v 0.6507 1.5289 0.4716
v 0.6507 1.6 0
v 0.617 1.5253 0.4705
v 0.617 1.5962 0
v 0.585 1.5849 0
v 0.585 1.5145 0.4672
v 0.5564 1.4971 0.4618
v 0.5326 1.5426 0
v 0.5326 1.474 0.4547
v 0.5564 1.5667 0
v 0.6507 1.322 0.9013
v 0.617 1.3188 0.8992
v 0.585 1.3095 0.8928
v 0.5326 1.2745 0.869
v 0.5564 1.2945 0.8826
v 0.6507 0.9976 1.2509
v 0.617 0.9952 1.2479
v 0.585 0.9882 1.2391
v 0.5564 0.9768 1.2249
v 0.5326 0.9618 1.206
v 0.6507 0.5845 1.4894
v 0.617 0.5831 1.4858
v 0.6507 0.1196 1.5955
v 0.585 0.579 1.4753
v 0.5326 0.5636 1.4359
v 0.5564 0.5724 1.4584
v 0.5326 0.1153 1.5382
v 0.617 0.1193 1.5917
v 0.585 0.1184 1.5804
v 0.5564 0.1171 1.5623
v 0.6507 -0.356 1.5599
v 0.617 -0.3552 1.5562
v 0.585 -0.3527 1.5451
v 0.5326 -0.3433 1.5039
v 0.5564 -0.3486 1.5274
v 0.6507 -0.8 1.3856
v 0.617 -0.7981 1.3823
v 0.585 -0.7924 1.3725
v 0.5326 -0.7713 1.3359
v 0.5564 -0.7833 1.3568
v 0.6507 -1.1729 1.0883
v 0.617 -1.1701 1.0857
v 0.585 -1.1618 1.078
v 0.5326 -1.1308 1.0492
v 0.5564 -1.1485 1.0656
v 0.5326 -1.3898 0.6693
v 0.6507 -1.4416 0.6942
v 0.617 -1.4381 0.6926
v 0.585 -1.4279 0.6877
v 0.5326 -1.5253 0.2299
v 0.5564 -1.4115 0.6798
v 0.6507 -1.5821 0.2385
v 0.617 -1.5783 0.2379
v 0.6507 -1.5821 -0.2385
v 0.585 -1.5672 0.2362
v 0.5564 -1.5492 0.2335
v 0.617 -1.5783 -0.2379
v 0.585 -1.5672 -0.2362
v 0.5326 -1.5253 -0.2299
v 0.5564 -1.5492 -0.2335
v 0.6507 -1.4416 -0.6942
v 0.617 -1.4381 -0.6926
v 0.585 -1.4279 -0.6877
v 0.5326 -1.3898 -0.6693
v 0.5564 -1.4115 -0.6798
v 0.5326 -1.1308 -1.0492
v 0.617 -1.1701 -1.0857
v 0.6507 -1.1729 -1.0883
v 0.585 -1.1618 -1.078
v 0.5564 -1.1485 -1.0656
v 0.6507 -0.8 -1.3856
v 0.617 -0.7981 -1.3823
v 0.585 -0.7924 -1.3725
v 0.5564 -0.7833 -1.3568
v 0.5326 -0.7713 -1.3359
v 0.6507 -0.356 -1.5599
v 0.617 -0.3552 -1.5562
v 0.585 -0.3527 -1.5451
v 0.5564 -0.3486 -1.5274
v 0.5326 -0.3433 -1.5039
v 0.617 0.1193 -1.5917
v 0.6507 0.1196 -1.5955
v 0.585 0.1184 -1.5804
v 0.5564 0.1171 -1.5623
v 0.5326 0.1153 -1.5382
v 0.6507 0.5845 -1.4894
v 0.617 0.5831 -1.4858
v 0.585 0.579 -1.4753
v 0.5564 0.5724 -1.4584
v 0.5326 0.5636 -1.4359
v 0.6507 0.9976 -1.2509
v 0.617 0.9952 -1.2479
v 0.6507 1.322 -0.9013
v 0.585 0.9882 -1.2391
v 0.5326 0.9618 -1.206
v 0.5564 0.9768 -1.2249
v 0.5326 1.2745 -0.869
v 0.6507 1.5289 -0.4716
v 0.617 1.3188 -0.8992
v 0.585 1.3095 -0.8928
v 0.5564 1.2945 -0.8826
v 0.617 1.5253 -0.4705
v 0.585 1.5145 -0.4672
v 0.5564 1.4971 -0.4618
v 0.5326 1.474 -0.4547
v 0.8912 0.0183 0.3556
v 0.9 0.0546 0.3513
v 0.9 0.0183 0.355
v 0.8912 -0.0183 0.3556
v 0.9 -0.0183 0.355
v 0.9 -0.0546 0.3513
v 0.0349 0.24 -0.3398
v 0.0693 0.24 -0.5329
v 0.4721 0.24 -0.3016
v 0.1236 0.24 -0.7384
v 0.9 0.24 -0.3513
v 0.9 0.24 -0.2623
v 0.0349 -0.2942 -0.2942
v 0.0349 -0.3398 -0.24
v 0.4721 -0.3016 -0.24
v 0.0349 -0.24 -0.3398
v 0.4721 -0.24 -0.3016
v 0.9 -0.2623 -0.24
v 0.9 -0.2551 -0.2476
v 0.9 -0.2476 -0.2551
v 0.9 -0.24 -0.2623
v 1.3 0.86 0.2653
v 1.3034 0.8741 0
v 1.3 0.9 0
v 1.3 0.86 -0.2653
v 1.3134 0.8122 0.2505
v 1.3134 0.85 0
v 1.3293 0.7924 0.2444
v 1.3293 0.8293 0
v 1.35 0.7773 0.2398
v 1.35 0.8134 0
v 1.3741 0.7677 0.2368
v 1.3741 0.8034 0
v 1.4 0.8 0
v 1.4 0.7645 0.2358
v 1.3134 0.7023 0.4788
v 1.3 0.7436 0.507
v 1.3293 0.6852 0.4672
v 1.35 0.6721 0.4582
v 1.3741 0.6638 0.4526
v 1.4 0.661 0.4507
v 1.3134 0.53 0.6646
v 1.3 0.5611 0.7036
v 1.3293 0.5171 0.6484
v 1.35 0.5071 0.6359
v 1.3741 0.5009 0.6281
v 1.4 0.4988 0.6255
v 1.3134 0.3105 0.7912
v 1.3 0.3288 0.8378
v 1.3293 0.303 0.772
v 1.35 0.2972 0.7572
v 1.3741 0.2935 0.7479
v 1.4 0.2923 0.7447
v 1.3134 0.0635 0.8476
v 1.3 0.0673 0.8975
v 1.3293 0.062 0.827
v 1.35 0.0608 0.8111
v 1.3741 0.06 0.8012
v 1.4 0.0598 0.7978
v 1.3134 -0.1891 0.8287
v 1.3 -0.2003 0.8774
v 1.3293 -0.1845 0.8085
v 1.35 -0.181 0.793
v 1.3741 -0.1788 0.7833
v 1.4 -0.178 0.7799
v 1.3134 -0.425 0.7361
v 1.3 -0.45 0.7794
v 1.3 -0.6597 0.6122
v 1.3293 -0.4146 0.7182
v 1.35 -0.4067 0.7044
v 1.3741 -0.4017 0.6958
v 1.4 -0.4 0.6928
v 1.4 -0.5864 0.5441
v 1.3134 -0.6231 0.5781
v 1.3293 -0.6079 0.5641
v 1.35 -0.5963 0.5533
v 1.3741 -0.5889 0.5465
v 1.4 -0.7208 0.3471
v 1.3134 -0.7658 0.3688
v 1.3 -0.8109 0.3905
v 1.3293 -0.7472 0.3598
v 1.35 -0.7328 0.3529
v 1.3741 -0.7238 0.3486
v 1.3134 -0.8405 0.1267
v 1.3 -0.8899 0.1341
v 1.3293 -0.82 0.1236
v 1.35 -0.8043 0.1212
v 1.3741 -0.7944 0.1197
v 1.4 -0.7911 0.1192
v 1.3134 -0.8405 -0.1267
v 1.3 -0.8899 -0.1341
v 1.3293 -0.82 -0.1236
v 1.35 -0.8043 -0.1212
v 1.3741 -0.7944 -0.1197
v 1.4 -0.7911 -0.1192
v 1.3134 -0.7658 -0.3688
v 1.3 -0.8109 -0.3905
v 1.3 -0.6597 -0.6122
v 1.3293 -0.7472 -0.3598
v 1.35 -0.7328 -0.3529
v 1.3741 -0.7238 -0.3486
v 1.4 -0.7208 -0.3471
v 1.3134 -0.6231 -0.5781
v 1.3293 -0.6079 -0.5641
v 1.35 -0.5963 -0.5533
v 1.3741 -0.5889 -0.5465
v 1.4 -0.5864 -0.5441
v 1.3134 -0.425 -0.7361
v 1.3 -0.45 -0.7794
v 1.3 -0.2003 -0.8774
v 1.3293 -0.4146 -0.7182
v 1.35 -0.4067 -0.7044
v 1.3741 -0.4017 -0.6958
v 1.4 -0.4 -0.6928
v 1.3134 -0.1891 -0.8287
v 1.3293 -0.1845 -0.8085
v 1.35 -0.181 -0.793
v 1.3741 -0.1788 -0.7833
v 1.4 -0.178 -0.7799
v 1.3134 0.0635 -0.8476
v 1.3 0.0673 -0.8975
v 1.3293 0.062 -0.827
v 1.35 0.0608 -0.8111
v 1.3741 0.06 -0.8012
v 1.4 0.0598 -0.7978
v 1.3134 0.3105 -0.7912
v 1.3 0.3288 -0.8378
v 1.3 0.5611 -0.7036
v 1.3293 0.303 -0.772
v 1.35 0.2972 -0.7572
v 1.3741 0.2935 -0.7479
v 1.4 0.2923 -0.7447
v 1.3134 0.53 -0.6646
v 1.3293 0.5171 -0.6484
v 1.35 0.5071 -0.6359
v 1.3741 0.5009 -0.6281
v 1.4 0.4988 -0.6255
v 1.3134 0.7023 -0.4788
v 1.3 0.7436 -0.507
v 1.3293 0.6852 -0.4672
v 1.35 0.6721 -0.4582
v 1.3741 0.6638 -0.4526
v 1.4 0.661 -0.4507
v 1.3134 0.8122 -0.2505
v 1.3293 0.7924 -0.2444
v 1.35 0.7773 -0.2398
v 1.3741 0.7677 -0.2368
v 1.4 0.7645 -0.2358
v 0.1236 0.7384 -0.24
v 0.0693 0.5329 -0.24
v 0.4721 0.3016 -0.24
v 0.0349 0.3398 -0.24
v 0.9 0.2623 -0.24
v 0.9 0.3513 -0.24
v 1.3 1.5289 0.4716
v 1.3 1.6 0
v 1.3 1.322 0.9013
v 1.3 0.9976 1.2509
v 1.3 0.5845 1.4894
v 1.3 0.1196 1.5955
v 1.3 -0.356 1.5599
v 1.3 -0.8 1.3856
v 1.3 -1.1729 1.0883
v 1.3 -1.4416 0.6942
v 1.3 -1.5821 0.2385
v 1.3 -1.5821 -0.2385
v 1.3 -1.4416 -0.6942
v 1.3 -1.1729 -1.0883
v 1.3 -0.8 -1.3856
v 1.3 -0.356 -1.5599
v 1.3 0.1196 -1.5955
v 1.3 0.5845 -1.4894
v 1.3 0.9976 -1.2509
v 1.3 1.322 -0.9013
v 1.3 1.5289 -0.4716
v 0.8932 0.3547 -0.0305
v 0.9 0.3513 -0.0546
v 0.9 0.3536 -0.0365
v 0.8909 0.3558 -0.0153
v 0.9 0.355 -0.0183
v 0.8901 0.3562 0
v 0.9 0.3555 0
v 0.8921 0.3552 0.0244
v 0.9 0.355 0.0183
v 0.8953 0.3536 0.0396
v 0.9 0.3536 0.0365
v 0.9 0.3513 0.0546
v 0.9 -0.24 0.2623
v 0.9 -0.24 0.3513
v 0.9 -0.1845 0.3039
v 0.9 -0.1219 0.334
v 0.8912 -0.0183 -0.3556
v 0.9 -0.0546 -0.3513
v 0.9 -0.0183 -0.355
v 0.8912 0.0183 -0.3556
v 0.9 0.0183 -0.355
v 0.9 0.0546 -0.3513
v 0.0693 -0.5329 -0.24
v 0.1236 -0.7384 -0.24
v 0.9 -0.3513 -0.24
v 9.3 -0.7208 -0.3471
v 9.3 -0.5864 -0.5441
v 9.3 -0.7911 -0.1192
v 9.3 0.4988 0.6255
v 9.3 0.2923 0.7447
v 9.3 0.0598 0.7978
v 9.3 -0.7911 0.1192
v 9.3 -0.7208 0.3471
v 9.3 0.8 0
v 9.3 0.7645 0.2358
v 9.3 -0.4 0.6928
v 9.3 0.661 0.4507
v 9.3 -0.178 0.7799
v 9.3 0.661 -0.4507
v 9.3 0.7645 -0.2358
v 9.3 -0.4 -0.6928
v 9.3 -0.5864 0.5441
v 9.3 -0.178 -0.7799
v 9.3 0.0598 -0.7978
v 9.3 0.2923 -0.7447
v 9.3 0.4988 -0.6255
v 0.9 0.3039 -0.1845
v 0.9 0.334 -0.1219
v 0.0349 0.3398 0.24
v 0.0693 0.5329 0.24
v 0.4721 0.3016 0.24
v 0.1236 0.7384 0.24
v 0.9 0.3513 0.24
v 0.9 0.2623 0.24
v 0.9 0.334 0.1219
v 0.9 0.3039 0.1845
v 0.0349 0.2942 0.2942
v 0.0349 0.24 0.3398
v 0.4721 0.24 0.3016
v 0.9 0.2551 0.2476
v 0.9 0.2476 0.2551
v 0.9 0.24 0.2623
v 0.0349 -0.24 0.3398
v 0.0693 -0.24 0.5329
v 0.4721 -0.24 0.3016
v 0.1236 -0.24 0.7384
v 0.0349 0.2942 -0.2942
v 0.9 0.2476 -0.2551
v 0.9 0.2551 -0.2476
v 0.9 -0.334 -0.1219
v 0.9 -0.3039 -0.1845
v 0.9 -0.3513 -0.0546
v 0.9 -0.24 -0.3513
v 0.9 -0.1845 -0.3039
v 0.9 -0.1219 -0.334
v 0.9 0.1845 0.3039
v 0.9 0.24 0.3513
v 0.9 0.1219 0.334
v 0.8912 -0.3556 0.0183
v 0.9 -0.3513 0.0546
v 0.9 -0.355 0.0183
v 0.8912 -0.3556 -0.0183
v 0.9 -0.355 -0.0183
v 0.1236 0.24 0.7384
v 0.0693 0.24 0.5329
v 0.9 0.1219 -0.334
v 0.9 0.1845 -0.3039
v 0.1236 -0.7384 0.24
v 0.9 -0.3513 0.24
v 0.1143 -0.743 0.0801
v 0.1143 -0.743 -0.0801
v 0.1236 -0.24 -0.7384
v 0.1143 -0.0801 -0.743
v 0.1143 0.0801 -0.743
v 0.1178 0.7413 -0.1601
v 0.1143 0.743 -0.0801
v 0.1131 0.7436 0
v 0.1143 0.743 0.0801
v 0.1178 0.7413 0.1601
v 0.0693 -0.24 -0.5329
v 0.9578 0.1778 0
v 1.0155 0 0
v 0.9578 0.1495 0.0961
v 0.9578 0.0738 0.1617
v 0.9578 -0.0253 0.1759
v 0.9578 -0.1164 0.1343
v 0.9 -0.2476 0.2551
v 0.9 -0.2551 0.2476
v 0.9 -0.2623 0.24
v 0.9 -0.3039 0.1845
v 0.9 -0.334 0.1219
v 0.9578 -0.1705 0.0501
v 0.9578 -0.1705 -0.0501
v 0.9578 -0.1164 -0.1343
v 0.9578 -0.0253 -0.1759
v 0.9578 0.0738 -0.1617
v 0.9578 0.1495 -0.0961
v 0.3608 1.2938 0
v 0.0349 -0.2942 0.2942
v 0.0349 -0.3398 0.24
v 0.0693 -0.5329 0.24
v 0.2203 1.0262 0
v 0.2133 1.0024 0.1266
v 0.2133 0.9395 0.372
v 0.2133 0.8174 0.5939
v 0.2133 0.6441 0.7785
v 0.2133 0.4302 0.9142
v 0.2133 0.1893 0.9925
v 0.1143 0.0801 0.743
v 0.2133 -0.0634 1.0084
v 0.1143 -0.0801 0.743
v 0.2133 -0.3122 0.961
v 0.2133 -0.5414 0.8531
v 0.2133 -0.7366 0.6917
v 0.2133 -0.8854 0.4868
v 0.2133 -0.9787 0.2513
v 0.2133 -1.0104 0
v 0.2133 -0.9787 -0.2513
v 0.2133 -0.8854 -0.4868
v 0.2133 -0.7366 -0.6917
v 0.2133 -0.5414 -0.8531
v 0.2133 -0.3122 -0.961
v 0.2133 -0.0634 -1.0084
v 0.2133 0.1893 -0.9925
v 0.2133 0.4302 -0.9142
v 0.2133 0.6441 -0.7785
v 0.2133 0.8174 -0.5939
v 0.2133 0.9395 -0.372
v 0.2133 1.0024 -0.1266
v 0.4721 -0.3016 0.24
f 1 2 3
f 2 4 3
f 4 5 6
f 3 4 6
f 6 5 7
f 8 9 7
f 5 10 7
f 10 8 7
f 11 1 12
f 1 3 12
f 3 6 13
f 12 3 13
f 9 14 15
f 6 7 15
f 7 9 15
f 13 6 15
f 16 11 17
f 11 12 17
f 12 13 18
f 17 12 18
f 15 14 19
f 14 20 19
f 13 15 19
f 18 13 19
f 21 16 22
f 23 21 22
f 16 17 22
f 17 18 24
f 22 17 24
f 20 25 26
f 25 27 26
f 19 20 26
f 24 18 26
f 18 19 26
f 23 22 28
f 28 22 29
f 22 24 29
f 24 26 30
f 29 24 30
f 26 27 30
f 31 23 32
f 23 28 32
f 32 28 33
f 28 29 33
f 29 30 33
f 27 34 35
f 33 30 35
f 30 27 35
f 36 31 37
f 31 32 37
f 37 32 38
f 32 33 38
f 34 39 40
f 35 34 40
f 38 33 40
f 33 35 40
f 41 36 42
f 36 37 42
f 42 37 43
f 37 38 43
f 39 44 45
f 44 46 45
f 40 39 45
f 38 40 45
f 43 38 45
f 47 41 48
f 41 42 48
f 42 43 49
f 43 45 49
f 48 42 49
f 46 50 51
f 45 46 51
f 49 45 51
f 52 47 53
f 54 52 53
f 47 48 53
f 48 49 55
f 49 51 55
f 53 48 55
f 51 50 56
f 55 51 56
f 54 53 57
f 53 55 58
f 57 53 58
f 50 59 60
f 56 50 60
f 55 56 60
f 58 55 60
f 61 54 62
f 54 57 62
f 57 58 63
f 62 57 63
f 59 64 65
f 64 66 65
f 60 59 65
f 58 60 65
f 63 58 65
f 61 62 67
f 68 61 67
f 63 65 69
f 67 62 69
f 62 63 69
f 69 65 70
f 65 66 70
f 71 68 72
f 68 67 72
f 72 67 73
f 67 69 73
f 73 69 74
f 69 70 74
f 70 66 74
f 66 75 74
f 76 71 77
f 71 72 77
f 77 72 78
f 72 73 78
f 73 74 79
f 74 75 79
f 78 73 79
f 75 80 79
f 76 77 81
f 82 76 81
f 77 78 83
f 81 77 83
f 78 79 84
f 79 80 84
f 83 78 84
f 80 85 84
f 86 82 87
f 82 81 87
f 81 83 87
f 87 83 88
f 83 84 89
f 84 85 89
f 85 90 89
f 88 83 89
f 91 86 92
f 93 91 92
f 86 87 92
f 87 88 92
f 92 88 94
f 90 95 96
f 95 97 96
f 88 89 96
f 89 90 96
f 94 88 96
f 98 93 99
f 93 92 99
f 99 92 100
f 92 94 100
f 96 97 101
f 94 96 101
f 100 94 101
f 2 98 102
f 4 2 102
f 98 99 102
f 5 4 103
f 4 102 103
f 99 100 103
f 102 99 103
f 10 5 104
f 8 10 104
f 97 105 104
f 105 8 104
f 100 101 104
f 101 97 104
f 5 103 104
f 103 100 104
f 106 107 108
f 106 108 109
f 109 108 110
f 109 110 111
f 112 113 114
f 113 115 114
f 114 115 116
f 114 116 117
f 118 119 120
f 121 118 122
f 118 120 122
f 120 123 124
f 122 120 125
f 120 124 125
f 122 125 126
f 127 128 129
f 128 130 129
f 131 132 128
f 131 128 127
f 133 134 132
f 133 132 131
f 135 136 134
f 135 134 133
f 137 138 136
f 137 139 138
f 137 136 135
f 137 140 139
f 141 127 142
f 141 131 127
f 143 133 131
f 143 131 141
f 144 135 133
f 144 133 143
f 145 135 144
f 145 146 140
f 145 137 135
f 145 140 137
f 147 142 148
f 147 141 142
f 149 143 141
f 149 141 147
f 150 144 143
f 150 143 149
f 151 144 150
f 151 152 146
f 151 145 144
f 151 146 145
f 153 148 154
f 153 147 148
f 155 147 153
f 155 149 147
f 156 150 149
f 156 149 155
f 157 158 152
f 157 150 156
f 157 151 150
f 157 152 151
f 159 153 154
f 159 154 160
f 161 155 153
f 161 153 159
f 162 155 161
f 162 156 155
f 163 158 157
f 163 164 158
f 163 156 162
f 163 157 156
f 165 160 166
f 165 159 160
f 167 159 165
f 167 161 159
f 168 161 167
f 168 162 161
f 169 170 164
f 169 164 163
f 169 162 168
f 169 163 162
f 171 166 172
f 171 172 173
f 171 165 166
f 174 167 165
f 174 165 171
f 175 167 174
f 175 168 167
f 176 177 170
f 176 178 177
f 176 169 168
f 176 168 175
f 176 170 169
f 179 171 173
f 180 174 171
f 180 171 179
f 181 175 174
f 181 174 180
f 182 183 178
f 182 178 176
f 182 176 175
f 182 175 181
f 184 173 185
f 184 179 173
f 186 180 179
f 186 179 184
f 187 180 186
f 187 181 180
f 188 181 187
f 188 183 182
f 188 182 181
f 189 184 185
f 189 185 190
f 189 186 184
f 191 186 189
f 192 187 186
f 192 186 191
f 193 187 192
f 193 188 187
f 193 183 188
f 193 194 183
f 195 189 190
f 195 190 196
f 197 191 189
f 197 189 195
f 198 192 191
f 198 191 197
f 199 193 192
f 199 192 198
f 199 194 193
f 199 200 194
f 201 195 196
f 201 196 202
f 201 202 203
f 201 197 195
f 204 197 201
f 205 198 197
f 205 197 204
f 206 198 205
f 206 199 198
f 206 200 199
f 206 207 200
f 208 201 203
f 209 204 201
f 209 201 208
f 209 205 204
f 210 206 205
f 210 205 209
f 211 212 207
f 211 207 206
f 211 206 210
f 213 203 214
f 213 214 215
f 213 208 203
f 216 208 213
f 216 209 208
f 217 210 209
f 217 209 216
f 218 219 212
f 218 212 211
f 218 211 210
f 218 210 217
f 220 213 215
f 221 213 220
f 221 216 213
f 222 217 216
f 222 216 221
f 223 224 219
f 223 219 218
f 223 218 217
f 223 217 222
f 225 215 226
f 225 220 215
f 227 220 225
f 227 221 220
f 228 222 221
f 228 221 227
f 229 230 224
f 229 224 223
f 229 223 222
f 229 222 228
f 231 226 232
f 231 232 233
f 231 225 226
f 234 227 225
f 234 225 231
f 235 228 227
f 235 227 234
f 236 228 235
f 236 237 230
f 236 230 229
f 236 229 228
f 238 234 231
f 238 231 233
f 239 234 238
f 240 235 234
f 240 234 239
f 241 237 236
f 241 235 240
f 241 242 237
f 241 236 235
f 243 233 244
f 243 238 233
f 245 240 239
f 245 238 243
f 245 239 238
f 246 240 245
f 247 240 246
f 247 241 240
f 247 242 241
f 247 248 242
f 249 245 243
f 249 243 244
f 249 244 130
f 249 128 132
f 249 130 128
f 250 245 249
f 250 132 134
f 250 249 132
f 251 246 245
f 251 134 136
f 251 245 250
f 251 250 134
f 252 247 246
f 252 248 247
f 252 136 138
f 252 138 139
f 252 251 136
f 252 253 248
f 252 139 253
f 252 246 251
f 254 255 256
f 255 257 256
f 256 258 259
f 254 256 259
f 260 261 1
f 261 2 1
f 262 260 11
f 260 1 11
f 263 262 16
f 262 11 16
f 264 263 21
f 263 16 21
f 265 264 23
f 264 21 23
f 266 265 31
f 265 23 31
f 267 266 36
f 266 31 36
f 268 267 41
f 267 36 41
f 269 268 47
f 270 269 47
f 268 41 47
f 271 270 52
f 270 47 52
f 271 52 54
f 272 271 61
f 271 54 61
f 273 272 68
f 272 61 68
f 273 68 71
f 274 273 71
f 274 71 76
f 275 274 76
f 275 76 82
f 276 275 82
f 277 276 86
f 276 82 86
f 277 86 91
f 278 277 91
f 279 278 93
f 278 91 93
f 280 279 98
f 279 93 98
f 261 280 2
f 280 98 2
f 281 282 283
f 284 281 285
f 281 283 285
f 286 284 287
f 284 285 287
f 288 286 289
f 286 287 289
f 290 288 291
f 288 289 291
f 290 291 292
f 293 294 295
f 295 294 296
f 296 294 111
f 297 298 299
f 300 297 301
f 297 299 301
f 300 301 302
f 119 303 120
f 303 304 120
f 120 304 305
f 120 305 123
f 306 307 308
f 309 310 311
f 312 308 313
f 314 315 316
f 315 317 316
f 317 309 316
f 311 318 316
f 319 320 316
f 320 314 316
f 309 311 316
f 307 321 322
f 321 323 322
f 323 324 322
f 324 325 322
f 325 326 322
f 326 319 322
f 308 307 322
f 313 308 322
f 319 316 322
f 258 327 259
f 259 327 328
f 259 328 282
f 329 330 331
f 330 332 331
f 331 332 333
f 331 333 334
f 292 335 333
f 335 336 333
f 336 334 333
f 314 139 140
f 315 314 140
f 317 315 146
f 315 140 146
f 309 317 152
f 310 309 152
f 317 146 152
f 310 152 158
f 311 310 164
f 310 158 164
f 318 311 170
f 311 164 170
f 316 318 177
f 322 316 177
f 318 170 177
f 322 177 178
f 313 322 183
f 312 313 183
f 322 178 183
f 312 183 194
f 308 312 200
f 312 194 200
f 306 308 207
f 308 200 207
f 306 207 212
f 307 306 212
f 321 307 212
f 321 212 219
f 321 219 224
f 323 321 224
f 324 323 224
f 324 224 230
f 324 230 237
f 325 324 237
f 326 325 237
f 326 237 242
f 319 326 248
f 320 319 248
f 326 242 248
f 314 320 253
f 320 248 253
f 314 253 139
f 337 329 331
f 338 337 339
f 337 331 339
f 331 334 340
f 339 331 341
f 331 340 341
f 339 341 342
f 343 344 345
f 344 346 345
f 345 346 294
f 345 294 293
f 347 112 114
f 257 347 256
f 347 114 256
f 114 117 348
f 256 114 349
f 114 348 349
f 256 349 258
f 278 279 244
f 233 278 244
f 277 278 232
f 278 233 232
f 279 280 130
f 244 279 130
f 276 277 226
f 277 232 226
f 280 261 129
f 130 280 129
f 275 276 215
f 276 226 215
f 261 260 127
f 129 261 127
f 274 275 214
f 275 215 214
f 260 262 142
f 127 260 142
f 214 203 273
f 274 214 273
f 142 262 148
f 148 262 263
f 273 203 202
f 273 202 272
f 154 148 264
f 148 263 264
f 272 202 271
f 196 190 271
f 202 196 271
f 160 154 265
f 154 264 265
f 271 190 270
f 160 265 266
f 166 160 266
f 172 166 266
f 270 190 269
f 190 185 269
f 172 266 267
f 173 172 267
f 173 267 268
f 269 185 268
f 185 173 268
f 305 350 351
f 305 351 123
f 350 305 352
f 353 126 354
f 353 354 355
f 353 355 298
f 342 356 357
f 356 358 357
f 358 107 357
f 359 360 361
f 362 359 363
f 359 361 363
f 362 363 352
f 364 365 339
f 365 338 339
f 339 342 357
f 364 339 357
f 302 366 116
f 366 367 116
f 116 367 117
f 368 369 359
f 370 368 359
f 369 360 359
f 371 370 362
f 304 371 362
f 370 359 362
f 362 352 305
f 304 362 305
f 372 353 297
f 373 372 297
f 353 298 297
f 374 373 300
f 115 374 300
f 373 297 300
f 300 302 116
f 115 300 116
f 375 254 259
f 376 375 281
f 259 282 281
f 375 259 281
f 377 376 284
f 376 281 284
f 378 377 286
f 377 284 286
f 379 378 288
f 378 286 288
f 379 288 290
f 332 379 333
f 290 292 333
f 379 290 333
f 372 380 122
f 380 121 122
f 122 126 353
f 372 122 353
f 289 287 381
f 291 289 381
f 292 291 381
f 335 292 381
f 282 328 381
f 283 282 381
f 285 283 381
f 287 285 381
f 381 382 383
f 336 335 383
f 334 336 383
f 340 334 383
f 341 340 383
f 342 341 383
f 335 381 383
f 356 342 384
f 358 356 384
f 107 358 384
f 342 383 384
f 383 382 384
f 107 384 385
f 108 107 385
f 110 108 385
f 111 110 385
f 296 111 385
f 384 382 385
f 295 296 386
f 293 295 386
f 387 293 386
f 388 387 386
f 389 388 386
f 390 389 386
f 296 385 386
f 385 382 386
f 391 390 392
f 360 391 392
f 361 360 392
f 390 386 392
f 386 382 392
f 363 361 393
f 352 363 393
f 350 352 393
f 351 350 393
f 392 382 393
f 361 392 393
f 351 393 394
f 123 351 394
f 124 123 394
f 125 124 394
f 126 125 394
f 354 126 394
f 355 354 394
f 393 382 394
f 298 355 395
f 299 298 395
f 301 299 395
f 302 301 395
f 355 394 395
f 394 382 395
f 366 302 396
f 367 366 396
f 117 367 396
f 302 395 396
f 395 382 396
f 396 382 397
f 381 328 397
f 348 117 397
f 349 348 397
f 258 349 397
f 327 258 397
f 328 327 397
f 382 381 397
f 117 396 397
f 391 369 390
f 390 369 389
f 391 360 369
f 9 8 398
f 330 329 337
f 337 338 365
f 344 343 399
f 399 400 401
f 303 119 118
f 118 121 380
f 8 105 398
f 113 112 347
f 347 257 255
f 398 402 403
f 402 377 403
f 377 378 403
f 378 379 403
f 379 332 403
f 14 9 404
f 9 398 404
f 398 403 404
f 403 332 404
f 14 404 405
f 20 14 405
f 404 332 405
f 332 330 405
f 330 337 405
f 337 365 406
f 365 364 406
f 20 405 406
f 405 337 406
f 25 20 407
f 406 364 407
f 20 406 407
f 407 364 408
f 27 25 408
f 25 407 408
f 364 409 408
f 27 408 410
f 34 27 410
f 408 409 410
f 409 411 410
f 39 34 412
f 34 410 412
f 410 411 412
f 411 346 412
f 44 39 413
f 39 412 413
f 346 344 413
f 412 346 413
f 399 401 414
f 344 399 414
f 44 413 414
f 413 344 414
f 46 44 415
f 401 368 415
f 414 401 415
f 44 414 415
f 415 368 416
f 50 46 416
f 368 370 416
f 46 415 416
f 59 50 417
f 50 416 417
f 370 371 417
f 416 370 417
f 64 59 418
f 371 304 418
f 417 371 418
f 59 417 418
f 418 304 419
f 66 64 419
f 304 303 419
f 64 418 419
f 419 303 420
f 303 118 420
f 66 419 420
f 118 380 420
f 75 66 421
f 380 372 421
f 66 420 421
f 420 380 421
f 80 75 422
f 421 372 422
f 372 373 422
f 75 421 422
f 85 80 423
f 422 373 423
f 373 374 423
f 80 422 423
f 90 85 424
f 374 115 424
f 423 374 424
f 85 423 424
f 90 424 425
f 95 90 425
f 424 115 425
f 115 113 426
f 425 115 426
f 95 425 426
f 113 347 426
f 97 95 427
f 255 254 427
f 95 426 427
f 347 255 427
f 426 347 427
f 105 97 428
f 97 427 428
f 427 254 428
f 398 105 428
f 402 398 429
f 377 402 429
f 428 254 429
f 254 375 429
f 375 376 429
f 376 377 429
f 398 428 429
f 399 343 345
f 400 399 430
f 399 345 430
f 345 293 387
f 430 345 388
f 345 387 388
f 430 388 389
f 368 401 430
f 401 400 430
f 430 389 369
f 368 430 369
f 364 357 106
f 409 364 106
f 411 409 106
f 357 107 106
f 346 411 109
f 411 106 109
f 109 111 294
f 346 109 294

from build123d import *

# Parameters (mm, degrees)
FILLET1_R    = 0.1
SKETCH3_W    = 0.48
SKETCH3_H    = 1.6
SKETCH4_W    = 0.48
SKETCH4_H    = 0.702553256
RECPAT_COUNT = 2
RECPAT_ANGLE = 90


with BuildPart() as part:
    # BodySke → Base-Revolve (revolve)
    with BuildSketch(Plane.XY):
        with BuildLine():
            Line((1.3, 0.8), (1.3, 1.6))
            Line((1.3, 1.6), (0.650675799, 1.6))
            ThreePointArc((0.650675799, 1.6), (0.585036553, 1.584875829), (0.532633829, 1.542553191))
            ThreePointArc((0.532633829, 1.542553191), (0.136907172, 0.815960959), (0, 0))
            Line((0, 0), (9.3, 0))
            Line((9.3, 0), (9.3, 0.8))
            Line((9.3, 0.8), (1.3, 0.8))
        make_face()
    revolve(axis=Axis((-25.4, 0, 0), (1, 0, 0)))

    # Fillet1
    fillet1_edges = [part.edges().sort_by_distance(p)[0] for p in [
        (1.3, -0.8, 0),
    ]]
    fillet(fillet1_edges, radius=FILLET1_R)

    # Sketch3 → Recess section 0
    with BuildSketch(Plane(origin=(0, 0, 0), x_dir=(0, 0, -1), z_dir=(1, 0, 0))):
        Rectangle(SKETCH3_W, SKETCH3_H)
    # Sketch4 → Recess section 1
    with BuildSketch(Plane(origin=(0.9, 0, 0), x_dir=(0, 0, -1), z_dir=(1, 0, 0))):
        Rectangle(SKETCH4_W, SKETCH4_H)
    recess = loft(mode=Mode.SUBTRACT)

    # RecPat: Recess ×2 about axis
    recpat_axis = Axis((0, 0, 0), (1, 0, 0))
    for i in range(1, RECPAT_COUNT):
        add(recess.rotate(recpat_axis, i * RECPAT_ANGLE / (RECPAT_COUNT - 1)), mode=Mode.SUBTRACT)

    # RecCorSke → RecessCore (revolve, cut)
    with BuildSketch(Plane.XY):
        Polygon((0, 0), (0, 0.418434131), (0.9, 0.3555), (1.015508952, 0), align=None)
    revolve(axis=Axis((-3.175, 0, 0), (1, 0, 0)), mode=Mode.SUBTRACT)


solid = part.part
